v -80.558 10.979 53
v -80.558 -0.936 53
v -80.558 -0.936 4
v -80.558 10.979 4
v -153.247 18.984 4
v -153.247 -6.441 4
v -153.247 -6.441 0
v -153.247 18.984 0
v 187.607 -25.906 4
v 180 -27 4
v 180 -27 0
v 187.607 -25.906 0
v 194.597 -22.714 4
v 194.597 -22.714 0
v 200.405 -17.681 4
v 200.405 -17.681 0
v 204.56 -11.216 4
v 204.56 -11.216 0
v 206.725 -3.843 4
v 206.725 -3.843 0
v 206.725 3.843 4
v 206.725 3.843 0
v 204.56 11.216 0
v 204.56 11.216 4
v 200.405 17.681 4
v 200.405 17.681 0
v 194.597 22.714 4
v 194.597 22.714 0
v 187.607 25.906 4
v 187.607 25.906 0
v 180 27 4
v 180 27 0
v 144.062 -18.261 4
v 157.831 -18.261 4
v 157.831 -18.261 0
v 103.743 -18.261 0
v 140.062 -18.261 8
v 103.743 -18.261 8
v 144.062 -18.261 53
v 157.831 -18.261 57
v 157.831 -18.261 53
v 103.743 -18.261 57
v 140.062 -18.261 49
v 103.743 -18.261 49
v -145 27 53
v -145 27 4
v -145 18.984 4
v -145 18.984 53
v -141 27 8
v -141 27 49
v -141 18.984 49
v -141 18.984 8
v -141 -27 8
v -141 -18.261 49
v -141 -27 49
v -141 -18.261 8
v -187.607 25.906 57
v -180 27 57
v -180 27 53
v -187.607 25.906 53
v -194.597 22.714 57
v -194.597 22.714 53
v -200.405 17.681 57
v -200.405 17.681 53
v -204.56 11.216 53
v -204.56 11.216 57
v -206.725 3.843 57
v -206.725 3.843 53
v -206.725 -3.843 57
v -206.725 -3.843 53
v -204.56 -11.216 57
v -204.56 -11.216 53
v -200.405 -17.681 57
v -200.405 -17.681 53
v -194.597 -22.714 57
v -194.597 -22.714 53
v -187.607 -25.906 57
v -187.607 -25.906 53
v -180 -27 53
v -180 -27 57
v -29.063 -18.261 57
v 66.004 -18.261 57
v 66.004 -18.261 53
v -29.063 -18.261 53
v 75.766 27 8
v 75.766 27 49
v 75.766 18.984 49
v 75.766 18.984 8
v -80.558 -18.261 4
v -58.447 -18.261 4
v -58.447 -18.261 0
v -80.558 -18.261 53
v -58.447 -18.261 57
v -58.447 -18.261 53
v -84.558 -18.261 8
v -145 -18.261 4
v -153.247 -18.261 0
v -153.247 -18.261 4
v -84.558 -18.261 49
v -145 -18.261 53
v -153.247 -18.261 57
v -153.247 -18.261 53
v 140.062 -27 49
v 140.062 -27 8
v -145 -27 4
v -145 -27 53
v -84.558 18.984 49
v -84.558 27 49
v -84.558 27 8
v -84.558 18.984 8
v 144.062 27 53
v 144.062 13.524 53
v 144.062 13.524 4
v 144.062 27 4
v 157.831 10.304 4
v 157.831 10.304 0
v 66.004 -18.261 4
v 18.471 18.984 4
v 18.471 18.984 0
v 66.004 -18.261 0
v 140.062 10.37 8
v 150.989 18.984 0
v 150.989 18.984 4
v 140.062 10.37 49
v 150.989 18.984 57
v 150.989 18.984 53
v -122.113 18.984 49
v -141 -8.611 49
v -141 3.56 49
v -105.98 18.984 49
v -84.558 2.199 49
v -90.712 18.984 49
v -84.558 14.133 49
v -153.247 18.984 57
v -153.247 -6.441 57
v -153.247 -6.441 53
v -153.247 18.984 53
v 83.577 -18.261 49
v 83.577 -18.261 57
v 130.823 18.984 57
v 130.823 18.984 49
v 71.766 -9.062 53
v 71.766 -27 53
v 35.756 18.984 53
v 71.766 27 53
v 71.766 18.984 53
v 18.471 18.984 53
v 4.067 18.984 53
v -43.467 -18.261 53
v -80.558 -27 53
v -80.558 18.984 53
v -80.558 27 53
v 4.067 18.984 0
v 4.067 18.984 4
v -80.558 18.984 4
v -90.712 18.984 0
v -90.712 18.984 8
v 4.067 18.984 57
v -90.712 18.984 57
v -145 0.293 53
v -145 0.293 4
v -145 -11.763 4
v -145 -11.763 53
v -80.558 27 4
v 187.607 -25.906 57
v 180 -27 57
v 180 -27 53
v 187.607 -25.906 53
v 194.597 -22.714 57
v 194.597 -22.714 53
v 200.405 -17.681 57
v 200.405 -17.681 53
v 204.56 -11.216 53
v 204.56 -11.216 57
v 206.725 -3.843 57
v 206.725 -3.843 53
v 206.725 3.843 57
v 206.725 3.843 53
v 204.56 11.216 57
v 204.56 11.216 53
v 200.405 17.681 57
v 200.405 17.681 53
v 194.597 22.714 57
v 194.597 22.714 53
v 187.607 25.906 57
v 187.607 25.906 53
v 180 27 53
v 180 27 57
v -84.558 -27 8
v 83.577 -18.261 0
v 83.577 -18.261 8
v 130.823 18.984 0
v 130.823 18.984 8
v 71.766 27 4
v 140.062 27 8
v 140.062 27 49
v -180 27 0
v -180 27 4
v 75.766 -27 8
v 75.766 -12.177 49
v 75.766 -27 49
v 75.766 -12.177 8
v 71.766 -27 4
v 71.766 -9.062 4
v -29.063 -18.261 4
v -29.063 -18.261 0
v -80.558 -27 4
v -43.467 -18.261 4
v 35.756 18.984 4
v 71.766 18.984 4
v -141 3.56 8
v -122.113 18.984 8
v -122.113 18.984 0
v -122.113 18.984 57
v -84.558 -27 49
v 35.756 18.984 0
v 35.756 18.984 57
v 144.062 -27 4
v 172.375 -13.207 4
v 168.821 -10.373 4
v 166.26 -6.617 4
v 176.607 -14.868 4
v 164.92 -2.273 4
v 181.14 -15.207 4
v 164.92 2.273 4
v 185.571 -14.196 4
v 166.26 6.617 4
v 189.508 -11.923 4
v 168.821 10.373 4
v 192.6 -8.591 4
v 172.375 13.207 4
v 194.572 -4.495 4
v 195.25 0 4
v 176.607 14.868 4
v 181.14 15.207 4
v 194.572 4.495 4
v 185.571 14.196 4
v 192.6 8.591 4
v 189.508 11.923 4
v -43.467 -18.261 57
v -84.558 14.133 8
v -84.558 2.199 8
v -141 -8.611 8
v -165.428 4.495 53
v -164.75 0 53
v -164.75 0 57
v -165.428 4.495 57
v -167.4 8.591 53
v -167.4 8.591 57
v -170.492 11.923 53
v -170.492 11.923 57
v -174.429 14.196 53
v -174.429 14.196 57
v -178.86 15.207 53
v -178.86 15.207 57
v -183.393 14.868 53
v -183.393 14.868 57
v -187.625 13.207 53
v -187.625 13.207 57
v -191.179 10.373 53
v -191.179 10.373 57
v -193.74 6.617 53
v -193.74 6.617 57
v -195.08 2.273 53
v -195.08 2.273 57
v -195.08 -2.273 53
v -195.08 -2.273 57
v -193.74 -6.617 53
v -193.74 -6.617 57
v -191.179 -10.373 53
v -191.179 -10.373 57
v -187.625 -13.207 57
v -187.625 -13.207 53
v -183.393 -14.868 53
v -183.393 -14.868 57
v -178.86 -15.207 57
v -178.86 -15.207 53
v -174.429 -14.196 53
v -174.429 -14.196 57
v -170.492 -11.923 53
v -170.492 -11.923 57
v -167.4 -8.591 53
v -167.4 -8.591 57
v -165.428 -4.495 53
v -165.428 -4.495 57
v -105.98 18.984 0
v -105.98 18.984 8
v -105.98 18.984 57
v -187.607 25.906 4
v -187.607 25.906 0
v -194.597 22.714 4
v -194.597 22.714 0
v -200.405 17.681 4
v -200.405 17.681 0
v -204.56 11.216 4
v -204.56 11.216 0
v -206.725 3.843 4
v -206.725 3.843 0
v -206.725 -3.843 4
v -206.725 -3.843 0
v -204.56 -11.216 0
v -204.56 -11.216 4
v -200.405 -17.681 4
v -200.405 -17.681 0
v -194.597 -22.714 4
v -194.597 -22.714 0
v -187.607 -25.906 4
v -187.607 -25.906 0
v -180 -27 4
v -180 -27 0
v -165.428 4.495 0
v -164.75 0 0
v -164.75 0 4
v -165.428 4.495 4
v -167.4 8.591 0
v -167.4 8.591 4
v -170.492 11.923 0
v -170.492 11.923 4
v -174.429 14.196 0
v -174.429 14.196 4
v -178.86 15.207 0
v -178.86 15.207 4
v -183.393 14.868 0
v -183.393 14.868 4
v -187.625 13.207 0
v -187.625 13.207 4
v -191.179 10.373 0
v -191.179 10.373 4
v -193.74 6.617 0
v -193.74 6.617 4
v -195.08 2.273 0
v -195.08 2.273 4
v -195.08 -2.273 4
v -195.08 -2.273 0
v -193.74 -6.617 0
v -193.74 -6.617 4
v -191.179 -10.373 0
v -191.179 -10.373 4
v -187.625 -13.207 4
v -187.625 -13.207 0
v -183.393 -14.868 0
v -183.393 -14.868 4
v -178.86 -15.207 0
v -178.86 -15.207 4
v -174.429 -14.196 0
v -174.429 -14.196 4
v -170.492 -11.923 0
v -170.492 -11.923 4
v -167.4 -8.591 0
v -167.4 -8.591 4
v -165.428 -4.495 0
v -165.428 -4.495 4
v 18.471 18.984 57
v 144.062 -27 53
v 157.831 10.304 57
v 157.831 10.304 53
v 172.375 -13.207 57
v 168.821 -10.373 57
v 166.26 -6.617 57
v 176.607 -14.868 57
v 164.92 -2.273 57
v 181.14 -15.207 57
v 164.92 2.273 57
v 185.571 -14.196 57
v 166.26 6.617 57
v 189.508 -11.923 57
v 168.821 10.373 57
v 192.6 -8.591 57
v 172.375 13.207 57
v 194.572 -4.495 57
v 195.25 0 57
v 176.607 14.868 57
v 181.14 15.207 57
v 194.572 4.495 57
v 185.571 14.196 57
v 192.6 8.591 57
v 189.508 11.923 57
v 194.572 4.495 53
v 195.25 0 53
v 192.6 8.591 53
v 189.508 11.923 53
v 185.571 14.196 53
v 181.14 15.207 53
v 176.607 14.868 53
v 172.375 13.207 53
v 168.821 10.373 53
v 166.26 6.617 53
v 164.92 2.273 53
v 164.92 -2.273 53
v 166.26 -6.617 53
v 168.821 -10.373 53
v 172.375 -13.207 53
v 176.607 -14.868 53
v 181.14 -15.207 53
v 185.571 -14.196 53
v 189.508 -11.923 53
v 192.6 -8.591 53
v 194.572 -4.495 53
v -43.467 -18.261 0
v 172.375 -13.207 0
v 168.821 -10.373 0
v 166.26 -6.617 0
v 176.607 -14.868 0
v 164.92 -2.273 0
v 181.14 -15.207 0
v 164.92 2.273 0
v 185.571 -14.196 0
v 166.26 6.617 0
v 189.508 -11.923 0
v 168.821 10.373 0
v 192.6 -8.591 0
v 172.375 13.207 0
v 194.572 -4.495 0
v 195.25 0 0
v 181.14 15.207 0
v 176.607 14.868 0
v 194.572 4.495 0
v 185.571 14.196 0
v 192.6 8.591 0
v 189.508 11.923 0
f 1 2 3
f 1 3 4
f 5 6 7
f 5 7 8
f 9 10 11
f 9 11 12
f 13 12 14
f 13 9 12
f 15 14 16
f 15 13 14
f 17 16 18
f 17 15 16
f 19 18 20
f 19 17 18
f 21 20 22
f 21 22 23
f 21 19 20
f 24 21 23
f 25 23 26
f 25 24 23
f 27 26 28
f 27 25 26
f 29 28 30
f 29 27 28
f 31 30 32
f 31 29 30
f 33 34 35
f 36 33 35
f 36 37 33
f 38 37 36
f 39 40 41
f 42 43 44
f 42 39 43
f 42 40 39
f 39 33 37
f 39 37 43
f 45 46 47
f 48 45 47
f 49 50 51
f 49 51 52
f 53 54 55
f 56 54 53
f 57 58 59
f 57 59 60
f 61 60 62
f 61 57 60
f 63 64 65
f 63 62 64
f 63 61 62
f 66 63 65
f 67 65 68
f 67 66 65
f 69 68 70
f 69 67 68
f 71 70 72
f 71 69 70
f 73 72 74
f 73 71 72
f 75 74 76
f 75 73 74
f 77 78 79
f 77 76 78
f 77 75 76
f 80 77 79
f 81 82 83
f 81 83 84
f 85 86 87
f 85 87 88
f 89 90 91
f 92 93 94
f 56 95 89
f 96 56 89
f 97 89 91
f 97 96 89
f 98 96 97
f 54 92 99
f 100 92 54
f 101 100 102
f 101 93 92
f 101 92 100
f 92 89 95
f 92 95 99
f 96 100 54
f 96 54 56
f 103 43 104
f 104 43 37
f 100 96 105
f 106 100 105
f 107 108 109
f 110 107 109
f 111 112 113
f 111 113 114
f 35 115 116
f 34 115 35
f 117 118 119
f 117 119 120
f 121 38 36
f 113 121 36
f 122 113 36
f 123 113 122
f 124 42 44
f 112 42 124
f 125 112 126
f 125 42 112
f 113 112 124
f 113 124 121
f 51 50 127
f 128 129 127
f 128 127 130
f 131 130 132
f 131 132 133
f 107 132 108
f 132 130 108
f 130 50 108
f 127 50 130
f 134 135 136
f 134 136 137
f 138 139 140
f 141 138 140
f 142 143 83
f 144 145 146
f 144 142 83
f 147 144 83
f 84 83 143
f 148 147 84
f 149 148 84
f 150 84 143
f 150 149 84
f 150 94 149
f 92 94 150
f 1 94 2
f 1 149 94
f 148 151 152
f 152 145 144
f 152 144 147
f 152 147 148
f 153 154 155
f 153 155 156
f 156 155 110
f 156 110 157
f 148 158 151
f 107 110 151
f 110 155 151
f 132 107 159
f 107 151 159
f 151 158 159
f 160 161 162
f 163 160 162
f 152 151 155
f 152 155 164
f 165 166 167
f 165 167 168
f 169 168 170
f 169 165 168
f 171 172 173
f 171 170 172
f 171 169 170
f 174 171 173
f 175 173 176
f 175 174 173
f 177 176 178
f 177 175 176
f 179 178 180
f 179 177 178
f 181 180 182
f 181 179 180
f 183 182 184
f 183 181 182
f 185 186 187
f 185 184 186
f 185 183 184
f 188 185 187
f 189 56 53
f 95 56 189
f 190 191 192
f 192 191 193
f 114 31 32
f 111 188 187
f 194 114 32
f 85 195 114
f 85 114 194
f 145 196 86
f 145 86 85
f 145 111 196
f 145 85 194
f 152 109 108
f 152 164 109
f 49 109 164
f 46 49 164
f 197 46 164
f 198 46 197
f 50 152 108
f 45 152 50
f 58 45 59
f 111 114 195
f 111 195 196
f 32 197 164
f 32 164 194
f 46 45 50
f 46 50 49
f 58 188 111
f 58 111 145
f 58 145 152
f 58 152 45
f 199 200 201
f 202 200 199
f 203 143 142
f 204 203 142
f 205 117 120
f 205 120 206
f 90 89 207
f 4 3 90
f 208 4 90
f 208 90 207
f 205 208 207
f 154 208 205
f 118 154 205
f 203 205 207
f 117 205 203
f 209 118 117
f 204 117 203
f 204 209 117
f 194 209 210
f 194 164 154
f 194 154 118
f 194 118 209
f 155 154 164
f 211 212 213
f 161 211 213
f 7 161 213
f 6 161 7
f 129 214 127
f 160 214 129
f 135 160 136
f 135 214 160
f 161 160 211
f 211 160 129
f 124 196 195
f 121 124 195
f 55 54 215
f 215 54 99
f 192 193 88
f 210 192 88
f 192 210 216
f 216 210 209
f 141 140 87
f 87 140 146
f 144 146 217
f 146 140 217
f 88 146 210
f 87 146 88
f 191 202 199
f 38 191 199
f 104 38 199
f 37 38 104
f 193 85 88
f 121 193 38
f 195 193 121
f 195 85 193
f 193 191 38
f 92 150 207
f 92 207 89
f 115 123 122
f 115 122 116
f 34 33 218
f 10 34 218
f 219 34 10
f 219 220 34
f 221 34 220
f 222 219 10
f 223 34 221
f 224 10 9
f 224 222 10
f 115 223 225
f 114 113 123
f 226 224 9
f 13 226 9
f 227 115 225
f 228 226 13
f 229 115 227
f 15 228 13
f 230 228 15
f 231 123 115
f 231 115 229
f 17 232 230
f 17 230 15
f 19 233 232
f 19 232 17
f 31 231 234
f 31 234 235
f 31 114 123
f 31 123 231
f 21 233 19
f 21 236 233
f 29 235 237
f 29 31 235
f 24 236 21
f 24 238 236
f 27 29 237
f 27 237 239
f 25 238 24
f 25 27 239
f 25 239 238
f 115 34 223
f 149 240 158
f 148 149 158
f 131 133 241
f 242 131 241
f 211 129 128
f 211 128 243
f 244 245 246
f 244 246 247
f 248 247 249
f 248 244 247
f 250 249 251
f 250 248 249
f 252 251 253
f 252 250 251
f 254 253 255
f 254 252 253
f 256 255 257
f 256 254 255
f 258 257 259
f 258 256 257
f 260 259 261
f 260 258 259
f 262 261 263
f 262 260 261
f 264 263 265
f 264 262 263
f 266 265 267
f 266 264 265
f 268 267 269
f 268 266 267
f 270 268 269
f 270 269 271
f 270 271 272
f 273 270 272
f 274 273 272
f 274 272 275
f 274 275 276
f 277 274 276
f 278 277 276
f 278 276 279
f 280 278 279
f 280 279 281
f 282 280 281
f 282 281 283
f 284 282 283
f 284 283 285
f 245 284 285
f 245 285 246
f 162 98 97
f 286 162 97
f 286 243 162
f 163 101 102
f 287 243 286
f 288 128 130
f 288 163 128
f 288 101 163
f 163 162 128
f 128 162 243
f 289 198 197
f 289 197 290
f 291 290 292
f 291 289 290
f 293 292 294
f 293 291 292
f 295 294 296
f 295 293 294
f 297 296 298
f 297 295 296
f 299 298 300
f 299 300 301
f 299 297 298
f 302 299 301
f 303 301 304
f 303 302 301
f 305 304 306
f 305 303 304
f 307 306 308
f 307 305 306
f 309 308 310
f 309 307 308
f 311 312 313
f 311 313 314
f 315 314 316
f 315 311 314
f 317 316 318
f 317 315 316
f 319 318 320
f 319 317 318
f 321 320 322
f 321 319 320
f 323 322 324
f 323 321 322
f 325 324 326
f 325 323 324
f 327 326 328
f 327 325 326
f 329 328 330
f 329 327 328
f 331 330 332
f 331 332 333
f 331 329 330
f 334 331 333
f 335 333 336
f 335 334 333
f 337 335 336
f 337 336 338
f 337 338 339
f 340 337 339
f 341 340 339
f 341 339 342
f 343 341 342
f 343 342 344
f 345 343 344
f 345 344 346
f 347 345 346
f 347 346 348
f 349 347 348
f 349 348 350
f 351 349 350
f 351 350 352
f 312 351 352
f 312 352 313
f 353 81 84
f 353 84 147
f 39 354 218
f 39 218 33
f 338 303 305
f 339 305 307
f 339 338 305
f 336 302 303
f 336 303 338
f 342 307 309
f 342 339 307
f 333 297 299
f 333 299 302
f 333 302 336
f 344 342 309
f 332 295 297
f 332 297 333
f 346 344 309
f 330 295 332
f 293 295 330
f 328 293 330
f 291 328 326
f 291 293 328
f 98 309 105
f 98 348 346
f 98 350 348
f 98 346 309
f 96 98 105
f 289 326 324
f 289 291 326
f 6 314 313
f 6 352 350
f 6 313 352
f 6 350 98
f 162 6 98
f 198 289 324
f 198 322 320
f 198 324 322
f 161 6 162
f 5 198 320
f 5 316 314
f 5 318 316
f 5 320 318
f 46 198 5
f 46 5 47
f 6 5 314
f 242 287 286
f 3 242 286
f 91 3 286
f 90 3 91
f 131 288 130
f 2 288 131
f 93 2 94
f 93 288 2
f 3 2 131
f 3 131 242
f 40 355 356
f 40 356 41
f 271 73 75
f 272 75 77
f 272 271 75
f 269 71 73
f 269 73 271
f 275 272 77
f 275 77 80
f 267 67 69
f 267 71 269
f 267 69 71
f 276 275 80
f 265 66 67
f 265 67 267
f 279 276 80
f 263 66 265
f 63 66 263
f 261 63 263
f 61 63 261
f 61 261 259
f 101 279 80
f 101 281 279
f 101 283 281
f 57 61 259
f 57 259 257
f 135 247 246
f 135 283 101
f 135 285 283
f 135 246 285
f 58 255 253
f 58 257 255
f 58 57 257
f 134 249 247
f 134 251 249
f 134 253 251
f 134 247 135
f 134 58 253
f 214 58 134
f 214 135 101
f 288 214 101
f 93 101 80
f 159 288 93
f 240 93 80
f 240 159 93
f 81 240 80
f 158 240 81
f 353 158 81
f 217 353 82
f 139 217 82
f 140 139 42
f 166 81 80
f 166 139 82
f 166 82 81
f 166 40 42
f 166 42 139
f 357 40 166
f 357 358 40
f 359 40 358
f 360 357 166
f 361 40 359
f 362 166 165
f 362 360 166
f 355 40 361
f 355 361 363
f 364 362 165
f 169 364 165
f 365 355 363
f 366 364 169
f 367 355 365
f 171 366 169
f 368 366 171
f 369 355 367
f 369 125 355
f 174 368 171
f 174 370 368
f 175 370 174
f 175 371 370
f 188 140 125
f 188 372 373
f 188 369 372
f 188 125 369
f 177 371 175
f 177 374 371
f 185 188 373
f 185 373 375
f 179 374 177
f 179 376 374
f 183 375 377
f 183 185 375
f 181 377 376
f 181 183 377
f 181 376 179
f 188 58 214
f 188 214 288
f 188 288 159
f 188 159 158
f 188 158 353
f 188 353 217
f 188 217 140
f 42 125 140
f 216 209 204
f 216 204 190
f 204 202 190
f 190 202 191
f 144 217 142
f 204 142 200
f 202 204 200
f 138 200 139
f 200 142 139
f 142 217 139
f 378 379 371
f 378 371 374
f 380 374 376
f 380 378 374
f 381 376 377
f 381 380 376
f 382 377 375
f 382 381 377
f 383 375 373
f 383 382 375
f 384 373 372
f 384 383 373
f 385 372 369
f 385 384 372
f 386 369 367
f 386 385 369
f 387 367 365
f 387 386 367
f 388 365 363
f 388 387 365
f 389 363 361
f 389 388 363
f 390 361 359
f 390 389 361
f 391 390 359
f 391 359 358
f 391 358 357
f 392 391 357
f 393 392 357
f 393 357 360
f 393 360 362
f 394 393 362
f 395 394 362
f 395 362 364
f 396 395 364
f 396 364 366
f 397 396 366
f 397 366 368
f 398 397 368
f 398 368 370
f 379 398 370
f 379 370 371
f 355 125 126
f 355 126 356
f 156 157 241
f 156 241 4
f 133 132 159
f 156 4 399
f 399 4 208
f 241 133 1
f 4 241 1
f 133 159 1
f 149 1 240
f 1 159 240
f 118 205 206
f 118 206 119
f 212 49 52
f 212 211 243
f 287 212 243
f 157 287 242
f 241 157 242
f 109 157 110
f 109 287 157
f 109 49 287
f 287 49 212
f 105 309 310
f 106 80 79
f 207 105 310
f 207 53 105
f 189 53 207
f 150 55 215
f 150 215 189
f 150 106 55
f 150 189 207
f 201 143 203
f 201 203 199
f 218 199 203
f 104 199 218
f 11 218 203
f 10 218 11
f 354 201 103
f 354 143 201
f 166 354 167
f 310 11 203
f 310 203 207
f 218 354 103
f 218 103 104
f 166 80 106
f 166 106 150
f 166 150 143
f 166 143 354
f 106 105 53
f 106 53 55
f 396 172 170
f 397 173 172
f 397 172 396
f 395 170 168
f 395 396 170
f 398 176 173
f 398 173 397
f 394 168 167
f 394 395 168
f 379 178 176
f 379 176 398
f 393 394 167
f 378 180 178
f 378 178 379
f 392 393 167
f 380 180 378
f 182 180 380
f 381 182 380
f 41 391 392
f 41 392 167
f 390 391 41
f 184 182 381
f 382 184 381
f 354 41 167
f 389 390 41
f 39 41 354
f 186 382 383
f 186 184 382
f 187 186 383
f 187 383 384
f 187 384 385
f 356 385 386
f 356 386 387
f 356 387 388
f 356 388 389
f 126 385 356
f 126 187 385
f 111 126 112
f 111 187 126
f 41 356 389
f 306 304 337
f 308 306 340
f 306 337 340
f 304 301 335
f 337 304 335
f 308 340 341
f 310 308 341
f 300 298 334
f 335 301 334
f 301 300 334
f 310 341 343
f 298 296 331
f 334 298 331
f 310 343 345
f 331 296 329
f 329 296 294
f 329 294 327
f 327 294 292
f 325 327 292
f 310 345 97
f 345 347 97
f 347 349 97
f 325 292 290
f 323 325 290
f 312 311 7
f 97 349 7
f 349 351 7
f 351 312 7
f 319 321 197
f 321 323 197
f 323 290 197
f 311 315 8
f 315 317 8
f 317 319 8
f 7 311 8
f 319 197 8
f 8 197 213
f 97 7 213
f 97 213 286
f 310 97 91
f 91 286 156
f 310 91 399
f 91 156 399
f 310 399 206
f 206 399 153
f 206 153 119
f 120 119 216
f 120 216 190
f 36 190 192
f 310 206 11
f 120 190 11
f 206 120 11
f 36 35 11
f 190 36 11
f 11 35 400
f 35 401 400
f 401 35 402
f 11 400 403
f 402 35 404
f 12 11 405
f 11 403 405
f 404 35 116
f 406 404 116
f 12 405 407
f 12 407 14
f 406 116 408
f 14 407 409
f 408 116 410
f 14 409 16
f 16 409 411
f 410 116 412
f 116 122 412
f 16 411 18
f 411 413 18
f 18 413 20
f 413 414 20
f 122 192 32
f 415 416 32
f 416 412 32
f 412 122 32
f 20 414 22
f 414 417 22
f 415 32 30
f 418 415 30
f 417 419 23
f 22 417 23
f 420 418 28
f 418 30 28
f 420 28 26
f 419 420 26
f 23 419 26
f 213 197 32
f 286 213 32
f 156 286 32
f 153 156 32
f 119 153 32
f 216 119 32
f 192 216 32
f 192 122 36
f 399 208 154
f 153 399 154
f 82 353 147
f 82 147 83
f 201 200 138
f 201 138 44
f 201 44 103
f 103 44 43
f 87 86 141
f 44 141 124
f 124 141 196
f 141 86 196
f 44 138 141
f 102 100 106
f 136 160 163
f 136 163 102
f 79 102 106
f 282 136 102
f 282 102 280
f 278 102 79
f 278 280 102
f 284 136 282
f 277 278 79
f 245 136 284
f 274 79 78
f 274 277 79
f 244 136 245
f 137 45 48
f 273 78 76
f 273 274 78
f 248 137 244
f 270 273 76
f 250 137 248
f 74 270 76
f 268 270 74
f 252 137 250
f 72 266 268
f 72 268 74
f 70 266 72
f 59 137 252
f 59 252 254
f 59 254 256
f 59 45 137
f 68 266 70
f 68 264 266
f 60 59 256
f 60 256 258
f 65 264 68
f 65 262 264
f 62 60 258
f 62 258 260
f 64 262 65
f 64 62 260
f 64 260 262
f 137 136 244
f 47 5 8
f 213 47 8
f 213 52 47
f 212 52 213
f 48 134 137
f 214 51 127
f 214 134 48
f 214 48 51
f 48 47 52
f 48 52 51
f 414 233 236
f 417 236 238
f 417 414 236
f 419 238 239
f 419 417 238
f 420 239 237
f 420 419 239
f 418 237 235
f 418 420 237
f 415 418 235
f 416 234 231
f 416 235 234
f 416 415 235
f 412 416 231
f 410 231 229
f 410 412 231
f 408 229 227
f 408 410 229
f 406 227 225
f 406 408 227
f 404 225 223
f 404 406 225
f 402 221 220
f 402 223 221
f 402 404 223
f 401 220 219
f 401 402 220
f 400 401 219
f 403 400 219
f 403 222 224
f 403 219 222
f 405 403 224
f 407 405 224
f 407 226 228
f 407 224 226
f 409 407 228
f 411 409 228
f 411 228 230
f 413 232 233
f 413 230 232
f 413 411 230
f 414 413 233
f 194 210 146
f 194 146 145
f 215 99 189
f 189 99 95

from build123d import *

# Parameters (mm, degrees)
CROQUIS1_R              = 15.25
SALIENTE_EXTRUIR1_DEPTH = 57
CROQUIS2_W              = 70
CROQUIS2_H              = 44
CROQUIS2_W_2            = 152.323993802
CORTAR_EXTRUIR1_DEPTH   = 40
CORTAR_EXTRUIR3_DEPTH   = 75
CROQUIS4_R              = 15.25
CORTAR_EXTRUIR4_DEPTH   = 2.5
CROQUIS5_R              = 15.25
CORTAR_EXTRUIR5_DEPTH   = 2.5
CROQUIS6_R              = 15.083558861
CORTAR_EXTRUIR6_DEPTH   = 2.5
CROQUIS7_R              = 15.25
CORTAR_EXTRUIR7_DEPTH   = 2.5
CROQUIS8_W              = 152.323993802
CROQUIS8_H              = 54
CORTAR_EXTRUIR8_DEPTH   = 2.5
CROQUIS9_W              = 152.323993802
CROQUIS9_H              = 54
CORTAR_EXTRUIR9_DEPTH   = 2.5
CROQUIS10_W             = 56.441876841
CROQUIS10_H             = 41
CORTAR_EXTRUIR10_DEPTH  = 70
CROQUIS11_W             = 64.296395464
CROQUIS11_H             = 41
CORTAR_EXTRUIR11_DEPTH  = 70
CORTAR_EXTRUIR12_DEPTH  = 78


with BuildPart() as part:
    # Croquis1 → Saliente-Extruir1 (new body)
    with BuildSketch(Plane.XY):
        with BuildLine():
            Line((-180, -35), (180, -35))
            ThreePointArc((180, -35), (215, 0), (180, 35))
            Line((180, 35), (-180, 35))
            ThreePointArc((-180, 35), (-215, 0), (-180, -35))
        make_face()
        with Locations((-180, 0)):
            Circle(CROQUIS1_R, mode=Mode.SUBTRACT)
        with Locations((180, 0)):
            Circle(CROQUIS1_R, mode=Mode.SUBTRACT)
    extrude(amount=SALIENTE_EXTRUIR1_DEPTH)

    # Croquis2 → Cortar-Extruir1 (cut, symmetric)
    with BuildSketch(Plane(origin=(0, 0, 0), x_dir=(1, 0, 0), z_dir=(0, 1, 0))):
        with Locations((-180, -28.5)):
            Rectangle(CROQUIS2_W, CROQUIS2_H)
        with Locations((179.062266107, -28.5)):
            Rectangle(CROQUIS2_W, CROQUIS2_H)
        with Locations((-4.396126258, -28.5)):
            Rectangle(CROQUIS2_W_2, CROQUIS2_H)
    extrude(amount=CORTAR_EXTRUIR1_DEPTH, both=True, mode=Mode.SUBTRACT)

    # Croquis3 → Cortar-Extruir3 (cut, symmetric)
    with BuildSketch(Plane.XY):
        with BuildLine():
            Line((-180, -35), (180, -35))
            ThreePointArc((180, -35), (215, 0), (180, 35))
            Line((180, 35), (-180, 35))
            ThreePointArc((-180, 35), (-215, 0), (-180, -35))
        make_face()
        with BuildLine():
            Line((-180, -27), (180, -27))
            ThreePointArc((180, -27), (207, 0), (180, 27))
            Line((180, 27), (-180, 27))
            ThreePointArc((-180, 27), (-207, 0), (-180, -27))
        make_face(mode=Mode.SUBTRACT)
    extrude(amount=CORTAR_EXTRUIR3_DEPTH, both=True, mode=Mode.SUBTRACT)

    # Croquis4 → Cortar-Extruir4 (cut)
    with BuildSketch(Plane.XY.offset(6.5)):
        with BuildLine():
            Line((-145, 27), (-180, 27))
            ThreePointArc((-180, 27), (-207, 0), (-180, -27))
            Line((-180, -27), (-145, -27))
            Line((-145, -27), (-145, 27))
        make_face()
        with Locations((-180, 0)):
            Circle(CROQUIS4_R, mode=Mode.SUBTRACT)
    extrude(amount=-CORTAR_EXTRUIR4_DEPTH, mode=Mode.SUBTRACT)

    # Croquis5 → Cortar-Extruir5 (cut)
    with BuildSketch(Plane(origin=(0, 0, 50.5), x_dir=(-1, 0, 0), z_dir=(0, 0, -1))):
        with BuildLine():
            Line((180, 27), (145, 27))
            Line((145, 27), (145, -27))
            Line((145, -27), (180, -27))
            ThreePointArc((180, -27), (207, 0), (180, 27))
        make_face()
        with Locations((180, 0)):
            Circle(CROQUIS5_R, mode=Mode.SUBTRACT)
    extrude(amount=-CORTAR_EXTRUIR5_DEPTH, mode=Mode.SUBTRACT)

    # Croquis6 → Cortar-Extruir6 (cut)
    with BuildSketch(Plane.XY.offset(6.5)):
        with BuildLine():
            Line((180, 27), (144.062266107, 27))
            Line((144.062266107, 27), (144.062266107, -27))
            Line((144.062266107, -27), (180, -27))
            ThreePointArc((180, -27), (207, 0), (180, 27))
        make_face()
        with Locations((180, 0)):
            Circle(CROQUIS6_R, mode=Mode.SUBTRACT)
    extrude(amount=-CORTAR_EXTRUIR6_DEPTH, mode=Mode.SUBTRACT)

    # Croquis7 → Cortar-Extruir7 (cut)
    with BuildSketch(Plane(origin=(0, 0, 50.5), x_dir=(-1, 0, 0), z_dir=(0, 0, -1))):
        with BuildLine():
            Line((-180, -27), (-144.062266107, -27))
            Line((-144.062266107, -27), (-144.062266107, 27))
            Line((-144.062266107, 27), (-180, 27))
            ThreePointArc((-180, 27), (-207, 0), (-180, -27))
        make_face()
        with Locations((-180, 0)):
            Circle(CROQUIS7_R, mode=Mode.SUBTRACT)
    extrude(amount=-CORTAR_EXTRUIR7_DEPTH, mode=Mode.SUBTRACT)

    # Croquis8 → Cortar-Extruir8 (cut)
    with BuildSketch(Plane(origin=(0, 0, 50.5), x_dir=(-1, 0, 0), z_dir=(0, 0, -1))):
        with Locations((4.396126258, 0)):
            Rectangle(CROQUIS8_W, CROQUIS8_H)
    extrude(amount=-CORTAR_EXTRUIR8_DEPTH, mode=Mode.SUBTRACT)

    # Croquis9 → Cortar-Extruir9 (cut)
    with BuildSketch(Plane.XY.offset(6.5)):
        with Locations((-4.396126258, 0)):
            Rectangle(CROQUIS9_W, CROQUIS9_H)
    extrude(amount=-CORTAR_EXTRUIR9_DEPTH, mode=Mode.SUBTRACT)

    # Croquis10 → Cortar-Extruir10 (cut)
    with BuildSketch(Plane(origin=(0, 27, 0), x_dir=(1, 0, 0), z_dir=(0, 1, 0))):
        with Locations((-112.779061579, -28.5)):
            Rectangle(CROQUIS10_W, CROQUIS10_H)
    extrude(amount=-CORTAR_EXTRUIR10_DEPTH, mode=Mode.SUBTRACT)

    # Croquis11 → Cortar-Extruir11 (cut)
    with BuildSketch(Plane(origin=(0, 27, 0), x_dir=(1, 0, 0), z_dir=(0, 1, 0))):
        with Locations((107.914068375, -28.5)):
            Rectangle(CROQUIS11_W, CROQUIS11_H)
    extrude(amount=-CORTAR_EXTRUIR11_DEPTH, mode=Mode.SUBTRACT)

    # Croquis12 → Cortar-Extruir12 (cut)
    with BuildSketch(Plane.XY.offset(57)):
        Polygon((-153.246746746, -18.260795107), (-105.980425778, 18.9839027), (-58.446911177, -18.260795107), align=None)
        Polygon((-153.246746746, 18.9839027), (-122.113012552, 18.9839027), (-153.246746746, -6.441367348), align=None)
        Polygon((157.831126984, 10.304103568), (157.831126984, -18.260795107), (103.74320228, -18.260795107), (150.988634974, 18.9839027), align=None)
        Polygon((-90.712084725, 18.9839027), (-43.46665203, -18.260795107), (4.066862571, 18.9839027), align=None)
        Polygon((-29.062556696, -18.260795107), (18.470957905, 18.9839027), (66.004472506, -18.260795107), align=None)
        Polygon((35.755872305, 18.9839027), (83.577468813, -18.260795107), (130.822901507, 18.9839027), align=None)
    extrude(amount=-CORTAR_EXTRUIR12_DEPTH, mode=Mode.SUBTRACT)


solid = part.part
